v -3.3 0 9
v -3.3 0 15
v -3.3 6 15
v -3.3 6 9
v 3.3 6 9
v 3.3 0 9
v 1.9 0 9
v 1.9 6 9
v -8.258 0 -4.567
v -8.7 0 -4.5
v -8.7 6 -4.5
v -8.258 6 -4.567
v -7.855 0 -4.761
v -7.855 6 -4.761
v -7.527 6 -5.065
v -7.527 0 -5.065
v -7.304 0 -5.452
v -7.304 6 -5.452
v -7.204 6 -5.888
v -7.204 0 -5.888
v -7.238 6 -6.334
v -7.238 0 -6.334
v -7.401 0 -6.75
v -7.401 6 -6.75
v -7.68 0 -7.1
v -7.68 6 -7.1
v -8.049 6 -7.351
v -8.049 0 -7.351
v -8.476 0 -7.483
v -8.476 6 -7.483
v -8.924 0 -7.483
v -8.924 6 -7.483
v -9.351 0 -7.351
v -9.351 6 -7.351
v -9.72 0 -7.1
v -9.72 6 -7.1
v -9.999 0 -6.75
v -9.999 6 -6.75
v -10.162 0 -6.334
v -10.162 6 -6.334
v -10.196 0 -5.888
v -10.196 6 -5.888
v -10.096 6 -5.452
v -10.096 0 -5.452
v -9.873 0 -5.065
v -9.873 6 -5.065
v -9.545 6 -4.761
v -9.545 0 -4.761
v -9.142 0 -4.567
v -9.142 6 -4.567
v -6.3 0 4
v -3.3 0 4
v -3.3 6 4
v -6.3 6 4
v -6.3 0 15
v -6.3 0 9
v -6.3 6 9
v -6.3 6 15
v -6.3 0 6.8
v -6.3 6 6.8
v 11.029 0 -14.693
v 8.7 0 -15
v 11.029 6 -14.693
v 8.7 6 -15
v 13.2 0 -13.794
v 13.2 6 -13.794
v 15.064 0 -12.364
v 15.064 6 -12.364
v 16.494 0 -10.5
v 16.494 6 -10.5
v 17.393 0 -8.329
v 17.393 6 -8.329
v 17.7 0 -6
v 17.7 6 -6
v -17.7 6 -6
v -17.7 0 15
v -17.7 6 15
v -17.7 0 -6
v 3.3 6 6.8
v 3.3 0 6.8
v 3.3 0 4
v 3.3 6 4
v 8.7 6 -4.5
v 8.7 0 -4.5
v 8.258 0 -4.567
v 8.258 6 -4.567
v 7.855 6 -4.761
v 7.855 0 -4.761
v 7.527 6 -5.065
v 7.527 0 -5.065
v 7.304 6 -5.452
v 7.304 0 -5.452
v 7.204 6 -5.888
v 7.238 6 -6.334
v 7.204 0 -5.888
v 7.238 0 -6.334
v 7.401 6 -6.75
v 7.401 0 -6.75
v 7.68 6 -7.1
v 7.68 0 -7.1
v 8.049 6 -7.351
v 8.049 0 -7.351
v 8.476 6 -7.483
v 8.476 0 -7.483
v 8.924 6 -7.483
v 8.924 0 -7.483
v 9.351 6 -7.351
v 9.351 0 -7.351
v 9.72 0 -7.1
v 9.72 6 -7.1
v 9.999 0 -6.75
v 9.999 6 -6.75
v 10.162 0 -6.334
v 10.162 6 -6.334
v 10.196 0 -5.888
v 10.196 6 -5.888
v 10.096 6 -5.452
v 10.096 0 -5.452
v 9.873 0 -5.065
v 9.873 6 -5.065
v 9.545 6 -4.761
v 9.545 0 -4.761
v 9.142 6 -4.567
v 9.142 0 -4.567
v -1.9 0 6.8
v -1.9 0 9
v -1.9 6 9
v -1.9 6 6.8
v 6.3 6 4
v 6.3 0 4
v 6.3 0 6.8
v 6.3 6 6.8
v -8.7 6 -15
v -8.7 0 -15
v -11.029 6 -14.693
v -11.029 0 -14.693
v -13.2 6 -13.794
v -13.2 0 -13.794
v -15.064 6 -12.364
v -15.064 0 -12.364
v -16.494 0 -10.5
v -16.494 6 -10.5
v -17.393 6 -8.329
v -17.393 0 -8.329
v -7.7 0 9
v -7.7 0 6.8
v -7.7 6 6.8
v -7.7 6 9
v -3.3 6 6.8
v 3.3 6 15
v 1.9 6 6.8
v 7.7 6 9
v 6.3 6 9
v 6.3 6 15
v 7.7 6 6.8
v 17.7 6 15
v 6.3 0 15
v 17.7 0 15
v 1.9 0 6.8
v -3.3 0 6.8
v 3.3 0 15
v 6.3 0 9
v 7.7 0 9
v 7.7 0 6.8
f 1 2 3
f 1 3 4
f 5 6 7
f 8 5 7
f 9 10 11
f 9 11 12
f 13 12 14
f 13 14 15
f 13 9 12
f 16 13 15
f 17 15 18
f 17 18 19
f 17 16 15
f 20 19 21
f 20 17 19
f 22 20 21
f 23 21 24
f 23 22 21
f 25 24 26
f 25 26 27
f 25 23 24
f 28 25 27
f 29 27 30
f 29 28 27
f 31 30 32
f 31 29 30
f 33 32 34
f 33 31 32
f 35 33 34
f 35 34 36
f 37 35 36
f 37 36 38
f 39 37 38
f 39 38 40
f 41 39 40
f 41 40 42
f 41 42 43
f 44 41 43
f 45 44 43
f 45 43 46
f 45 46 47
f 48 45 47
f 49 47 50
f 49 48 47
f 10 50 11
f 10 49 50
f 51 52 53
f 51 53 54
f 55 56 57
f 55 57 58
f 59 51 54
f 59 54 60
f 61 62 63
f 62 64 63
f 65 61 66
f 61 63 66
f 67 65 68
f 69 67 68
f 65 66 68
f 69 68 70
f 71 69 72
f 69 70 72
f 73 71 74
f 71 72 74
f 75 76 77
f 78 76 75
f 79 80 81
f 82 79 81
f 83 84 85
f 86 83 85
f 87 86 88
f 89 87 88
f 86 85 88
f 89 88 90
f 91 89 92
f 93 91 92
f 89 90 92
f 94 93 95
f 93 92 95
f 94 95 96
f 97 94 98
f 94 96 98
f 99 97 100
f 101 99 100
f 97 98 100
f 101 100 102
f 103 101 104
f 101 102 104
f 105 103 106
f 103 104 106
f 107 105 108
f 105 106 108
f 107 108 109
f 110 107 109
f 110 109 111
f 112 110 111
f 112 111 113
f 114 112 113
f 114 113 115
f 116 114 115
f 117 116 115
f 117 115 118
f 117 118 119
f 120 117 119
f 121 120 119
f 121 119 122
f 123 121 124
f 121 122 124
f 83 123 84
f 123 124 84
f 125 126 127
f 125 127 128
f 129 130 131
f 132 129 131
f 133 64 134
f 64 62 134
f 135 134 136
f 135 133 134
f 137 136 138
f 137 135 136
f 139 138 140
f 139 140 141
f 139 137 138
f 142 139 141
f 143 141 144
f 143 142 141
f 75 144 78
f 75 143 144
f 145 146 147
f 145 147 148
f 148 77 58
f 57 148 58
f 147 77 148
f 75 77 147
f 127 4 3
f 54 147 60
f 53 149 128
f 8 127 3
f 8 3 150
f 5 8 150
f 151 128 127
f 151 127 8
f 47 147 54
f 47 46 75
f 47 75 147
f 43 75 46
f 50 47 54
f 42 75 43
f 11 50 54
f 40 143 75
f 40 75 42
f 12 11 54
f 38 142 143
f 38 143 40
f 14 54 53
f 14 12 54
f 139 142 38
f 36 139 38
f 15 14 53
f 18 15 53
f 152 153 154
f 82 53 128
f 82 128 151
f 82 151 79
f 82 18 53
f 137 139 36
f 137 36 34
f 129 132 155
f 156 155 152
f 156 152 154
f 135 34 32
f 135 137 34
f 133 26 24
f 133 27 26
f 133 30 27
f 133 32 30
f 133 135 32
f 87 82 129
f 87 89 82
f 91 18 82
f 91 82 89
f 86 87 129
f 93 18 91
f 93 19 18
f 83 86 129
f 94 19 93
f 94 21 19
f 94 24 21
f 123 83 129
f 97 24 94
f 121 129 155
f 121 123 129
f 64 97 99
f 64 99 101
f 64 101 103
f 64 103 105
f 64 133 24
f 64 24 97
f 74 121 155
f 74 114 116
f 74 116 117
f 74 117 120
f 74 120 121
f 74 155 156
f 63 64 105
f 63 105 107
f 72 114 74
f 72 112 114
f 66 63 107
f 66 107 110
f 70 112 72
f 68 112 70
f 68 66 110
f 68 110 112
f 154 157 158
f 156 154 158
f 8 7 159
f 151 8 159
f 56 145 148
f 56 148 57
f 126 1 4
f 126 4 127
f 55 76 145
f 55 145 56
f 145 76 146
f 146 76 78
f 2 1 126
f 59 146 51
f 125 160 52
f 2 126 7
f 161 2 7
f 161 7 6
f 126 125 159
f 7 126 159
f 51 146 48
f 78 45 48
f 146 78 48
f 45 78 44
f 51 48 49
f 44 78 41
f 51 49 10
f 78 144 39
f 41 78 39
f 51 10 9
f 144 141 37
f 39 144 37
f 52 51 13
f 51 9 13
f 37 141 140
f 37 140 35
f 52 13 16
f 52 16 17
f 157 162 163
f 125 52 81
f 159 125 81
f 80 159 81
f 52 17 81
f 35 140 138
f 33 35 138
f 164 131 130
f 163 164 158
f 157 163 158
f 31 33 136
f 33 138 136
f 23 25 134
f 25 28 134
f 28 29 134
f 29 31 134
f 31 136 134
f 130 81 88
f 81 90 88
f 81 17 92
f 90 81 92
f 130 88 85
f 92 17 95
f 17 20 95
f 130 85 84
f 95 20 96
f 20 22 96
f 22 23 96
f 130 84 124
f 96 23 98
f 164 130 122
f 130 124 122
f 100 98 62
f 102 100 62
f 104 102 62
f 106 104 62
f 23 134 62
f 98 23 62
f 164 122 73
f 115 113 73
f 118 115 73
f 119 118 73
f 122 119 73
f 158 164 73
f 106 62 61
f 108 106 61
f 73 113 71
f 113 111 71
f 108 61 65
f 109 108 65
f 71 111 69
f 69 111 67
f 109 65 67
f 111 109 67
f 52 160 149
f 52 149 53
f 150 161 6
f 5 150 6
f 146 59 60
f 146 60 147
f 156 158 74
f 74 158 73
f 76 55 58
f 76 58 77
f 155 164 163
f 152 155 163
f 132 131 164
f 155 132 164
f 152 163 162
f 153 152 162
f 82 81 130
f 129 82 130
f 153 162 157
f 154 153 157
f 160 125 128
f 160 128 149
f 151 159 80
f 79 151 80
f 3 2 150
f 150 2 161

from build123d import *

# Parameters (mm, degrees)
SKETCH1_R           = 1.5
BOSS_EXTRUDE1_DEPTH = 6
FILLET1_R           = 9


with BuildPart() as part:
    # Sketch1 → Boss-Extrude1 (new body)
    with BuildSketch(Plane(origin=(0, 0, 0), x_dir=(1, 0, 0), z_dir=(0, 1, 0))):
        Polygon((-17.7, 15), (0, 15), (0, -15), (-3.3, -15), (-3.3, -9), (-1.9, -9), (-1.9, -6.8), (-3.3, -6.8), (-3.3, -4), (-6.3, -4), (-6.3, -6.8), (-7.7, -6.8), (-7.7, -9), (-6.3, -9), (-6.3, -15), (-17.7, -15), align=None)
        with Locations((-8.7, 6)):
            Circle(SKETCH1_R, mode=Mode.SUBTRACT)
    extrude(amount=BOSS_EXTRUDE1_DEPTH)

    # Mirror1: part across plane


with BuildPart() as part_1:
    add(part.part)
    add(part.part.mirror(Plane(origin=(0, 6, -15), x_dir=(0, 0, 1), z_dir=(-1, 0, 0))))

    # Fillet1
    fillet1_edges = [part_1.edges().sort_by_distance(p)[0] for p in [
        (17.7, 3, -15),
        (-17.7, 3, -15),
    ]]
    fillet(fillet1_edges, radius=FILLET1_R)


solid = part_1.part
